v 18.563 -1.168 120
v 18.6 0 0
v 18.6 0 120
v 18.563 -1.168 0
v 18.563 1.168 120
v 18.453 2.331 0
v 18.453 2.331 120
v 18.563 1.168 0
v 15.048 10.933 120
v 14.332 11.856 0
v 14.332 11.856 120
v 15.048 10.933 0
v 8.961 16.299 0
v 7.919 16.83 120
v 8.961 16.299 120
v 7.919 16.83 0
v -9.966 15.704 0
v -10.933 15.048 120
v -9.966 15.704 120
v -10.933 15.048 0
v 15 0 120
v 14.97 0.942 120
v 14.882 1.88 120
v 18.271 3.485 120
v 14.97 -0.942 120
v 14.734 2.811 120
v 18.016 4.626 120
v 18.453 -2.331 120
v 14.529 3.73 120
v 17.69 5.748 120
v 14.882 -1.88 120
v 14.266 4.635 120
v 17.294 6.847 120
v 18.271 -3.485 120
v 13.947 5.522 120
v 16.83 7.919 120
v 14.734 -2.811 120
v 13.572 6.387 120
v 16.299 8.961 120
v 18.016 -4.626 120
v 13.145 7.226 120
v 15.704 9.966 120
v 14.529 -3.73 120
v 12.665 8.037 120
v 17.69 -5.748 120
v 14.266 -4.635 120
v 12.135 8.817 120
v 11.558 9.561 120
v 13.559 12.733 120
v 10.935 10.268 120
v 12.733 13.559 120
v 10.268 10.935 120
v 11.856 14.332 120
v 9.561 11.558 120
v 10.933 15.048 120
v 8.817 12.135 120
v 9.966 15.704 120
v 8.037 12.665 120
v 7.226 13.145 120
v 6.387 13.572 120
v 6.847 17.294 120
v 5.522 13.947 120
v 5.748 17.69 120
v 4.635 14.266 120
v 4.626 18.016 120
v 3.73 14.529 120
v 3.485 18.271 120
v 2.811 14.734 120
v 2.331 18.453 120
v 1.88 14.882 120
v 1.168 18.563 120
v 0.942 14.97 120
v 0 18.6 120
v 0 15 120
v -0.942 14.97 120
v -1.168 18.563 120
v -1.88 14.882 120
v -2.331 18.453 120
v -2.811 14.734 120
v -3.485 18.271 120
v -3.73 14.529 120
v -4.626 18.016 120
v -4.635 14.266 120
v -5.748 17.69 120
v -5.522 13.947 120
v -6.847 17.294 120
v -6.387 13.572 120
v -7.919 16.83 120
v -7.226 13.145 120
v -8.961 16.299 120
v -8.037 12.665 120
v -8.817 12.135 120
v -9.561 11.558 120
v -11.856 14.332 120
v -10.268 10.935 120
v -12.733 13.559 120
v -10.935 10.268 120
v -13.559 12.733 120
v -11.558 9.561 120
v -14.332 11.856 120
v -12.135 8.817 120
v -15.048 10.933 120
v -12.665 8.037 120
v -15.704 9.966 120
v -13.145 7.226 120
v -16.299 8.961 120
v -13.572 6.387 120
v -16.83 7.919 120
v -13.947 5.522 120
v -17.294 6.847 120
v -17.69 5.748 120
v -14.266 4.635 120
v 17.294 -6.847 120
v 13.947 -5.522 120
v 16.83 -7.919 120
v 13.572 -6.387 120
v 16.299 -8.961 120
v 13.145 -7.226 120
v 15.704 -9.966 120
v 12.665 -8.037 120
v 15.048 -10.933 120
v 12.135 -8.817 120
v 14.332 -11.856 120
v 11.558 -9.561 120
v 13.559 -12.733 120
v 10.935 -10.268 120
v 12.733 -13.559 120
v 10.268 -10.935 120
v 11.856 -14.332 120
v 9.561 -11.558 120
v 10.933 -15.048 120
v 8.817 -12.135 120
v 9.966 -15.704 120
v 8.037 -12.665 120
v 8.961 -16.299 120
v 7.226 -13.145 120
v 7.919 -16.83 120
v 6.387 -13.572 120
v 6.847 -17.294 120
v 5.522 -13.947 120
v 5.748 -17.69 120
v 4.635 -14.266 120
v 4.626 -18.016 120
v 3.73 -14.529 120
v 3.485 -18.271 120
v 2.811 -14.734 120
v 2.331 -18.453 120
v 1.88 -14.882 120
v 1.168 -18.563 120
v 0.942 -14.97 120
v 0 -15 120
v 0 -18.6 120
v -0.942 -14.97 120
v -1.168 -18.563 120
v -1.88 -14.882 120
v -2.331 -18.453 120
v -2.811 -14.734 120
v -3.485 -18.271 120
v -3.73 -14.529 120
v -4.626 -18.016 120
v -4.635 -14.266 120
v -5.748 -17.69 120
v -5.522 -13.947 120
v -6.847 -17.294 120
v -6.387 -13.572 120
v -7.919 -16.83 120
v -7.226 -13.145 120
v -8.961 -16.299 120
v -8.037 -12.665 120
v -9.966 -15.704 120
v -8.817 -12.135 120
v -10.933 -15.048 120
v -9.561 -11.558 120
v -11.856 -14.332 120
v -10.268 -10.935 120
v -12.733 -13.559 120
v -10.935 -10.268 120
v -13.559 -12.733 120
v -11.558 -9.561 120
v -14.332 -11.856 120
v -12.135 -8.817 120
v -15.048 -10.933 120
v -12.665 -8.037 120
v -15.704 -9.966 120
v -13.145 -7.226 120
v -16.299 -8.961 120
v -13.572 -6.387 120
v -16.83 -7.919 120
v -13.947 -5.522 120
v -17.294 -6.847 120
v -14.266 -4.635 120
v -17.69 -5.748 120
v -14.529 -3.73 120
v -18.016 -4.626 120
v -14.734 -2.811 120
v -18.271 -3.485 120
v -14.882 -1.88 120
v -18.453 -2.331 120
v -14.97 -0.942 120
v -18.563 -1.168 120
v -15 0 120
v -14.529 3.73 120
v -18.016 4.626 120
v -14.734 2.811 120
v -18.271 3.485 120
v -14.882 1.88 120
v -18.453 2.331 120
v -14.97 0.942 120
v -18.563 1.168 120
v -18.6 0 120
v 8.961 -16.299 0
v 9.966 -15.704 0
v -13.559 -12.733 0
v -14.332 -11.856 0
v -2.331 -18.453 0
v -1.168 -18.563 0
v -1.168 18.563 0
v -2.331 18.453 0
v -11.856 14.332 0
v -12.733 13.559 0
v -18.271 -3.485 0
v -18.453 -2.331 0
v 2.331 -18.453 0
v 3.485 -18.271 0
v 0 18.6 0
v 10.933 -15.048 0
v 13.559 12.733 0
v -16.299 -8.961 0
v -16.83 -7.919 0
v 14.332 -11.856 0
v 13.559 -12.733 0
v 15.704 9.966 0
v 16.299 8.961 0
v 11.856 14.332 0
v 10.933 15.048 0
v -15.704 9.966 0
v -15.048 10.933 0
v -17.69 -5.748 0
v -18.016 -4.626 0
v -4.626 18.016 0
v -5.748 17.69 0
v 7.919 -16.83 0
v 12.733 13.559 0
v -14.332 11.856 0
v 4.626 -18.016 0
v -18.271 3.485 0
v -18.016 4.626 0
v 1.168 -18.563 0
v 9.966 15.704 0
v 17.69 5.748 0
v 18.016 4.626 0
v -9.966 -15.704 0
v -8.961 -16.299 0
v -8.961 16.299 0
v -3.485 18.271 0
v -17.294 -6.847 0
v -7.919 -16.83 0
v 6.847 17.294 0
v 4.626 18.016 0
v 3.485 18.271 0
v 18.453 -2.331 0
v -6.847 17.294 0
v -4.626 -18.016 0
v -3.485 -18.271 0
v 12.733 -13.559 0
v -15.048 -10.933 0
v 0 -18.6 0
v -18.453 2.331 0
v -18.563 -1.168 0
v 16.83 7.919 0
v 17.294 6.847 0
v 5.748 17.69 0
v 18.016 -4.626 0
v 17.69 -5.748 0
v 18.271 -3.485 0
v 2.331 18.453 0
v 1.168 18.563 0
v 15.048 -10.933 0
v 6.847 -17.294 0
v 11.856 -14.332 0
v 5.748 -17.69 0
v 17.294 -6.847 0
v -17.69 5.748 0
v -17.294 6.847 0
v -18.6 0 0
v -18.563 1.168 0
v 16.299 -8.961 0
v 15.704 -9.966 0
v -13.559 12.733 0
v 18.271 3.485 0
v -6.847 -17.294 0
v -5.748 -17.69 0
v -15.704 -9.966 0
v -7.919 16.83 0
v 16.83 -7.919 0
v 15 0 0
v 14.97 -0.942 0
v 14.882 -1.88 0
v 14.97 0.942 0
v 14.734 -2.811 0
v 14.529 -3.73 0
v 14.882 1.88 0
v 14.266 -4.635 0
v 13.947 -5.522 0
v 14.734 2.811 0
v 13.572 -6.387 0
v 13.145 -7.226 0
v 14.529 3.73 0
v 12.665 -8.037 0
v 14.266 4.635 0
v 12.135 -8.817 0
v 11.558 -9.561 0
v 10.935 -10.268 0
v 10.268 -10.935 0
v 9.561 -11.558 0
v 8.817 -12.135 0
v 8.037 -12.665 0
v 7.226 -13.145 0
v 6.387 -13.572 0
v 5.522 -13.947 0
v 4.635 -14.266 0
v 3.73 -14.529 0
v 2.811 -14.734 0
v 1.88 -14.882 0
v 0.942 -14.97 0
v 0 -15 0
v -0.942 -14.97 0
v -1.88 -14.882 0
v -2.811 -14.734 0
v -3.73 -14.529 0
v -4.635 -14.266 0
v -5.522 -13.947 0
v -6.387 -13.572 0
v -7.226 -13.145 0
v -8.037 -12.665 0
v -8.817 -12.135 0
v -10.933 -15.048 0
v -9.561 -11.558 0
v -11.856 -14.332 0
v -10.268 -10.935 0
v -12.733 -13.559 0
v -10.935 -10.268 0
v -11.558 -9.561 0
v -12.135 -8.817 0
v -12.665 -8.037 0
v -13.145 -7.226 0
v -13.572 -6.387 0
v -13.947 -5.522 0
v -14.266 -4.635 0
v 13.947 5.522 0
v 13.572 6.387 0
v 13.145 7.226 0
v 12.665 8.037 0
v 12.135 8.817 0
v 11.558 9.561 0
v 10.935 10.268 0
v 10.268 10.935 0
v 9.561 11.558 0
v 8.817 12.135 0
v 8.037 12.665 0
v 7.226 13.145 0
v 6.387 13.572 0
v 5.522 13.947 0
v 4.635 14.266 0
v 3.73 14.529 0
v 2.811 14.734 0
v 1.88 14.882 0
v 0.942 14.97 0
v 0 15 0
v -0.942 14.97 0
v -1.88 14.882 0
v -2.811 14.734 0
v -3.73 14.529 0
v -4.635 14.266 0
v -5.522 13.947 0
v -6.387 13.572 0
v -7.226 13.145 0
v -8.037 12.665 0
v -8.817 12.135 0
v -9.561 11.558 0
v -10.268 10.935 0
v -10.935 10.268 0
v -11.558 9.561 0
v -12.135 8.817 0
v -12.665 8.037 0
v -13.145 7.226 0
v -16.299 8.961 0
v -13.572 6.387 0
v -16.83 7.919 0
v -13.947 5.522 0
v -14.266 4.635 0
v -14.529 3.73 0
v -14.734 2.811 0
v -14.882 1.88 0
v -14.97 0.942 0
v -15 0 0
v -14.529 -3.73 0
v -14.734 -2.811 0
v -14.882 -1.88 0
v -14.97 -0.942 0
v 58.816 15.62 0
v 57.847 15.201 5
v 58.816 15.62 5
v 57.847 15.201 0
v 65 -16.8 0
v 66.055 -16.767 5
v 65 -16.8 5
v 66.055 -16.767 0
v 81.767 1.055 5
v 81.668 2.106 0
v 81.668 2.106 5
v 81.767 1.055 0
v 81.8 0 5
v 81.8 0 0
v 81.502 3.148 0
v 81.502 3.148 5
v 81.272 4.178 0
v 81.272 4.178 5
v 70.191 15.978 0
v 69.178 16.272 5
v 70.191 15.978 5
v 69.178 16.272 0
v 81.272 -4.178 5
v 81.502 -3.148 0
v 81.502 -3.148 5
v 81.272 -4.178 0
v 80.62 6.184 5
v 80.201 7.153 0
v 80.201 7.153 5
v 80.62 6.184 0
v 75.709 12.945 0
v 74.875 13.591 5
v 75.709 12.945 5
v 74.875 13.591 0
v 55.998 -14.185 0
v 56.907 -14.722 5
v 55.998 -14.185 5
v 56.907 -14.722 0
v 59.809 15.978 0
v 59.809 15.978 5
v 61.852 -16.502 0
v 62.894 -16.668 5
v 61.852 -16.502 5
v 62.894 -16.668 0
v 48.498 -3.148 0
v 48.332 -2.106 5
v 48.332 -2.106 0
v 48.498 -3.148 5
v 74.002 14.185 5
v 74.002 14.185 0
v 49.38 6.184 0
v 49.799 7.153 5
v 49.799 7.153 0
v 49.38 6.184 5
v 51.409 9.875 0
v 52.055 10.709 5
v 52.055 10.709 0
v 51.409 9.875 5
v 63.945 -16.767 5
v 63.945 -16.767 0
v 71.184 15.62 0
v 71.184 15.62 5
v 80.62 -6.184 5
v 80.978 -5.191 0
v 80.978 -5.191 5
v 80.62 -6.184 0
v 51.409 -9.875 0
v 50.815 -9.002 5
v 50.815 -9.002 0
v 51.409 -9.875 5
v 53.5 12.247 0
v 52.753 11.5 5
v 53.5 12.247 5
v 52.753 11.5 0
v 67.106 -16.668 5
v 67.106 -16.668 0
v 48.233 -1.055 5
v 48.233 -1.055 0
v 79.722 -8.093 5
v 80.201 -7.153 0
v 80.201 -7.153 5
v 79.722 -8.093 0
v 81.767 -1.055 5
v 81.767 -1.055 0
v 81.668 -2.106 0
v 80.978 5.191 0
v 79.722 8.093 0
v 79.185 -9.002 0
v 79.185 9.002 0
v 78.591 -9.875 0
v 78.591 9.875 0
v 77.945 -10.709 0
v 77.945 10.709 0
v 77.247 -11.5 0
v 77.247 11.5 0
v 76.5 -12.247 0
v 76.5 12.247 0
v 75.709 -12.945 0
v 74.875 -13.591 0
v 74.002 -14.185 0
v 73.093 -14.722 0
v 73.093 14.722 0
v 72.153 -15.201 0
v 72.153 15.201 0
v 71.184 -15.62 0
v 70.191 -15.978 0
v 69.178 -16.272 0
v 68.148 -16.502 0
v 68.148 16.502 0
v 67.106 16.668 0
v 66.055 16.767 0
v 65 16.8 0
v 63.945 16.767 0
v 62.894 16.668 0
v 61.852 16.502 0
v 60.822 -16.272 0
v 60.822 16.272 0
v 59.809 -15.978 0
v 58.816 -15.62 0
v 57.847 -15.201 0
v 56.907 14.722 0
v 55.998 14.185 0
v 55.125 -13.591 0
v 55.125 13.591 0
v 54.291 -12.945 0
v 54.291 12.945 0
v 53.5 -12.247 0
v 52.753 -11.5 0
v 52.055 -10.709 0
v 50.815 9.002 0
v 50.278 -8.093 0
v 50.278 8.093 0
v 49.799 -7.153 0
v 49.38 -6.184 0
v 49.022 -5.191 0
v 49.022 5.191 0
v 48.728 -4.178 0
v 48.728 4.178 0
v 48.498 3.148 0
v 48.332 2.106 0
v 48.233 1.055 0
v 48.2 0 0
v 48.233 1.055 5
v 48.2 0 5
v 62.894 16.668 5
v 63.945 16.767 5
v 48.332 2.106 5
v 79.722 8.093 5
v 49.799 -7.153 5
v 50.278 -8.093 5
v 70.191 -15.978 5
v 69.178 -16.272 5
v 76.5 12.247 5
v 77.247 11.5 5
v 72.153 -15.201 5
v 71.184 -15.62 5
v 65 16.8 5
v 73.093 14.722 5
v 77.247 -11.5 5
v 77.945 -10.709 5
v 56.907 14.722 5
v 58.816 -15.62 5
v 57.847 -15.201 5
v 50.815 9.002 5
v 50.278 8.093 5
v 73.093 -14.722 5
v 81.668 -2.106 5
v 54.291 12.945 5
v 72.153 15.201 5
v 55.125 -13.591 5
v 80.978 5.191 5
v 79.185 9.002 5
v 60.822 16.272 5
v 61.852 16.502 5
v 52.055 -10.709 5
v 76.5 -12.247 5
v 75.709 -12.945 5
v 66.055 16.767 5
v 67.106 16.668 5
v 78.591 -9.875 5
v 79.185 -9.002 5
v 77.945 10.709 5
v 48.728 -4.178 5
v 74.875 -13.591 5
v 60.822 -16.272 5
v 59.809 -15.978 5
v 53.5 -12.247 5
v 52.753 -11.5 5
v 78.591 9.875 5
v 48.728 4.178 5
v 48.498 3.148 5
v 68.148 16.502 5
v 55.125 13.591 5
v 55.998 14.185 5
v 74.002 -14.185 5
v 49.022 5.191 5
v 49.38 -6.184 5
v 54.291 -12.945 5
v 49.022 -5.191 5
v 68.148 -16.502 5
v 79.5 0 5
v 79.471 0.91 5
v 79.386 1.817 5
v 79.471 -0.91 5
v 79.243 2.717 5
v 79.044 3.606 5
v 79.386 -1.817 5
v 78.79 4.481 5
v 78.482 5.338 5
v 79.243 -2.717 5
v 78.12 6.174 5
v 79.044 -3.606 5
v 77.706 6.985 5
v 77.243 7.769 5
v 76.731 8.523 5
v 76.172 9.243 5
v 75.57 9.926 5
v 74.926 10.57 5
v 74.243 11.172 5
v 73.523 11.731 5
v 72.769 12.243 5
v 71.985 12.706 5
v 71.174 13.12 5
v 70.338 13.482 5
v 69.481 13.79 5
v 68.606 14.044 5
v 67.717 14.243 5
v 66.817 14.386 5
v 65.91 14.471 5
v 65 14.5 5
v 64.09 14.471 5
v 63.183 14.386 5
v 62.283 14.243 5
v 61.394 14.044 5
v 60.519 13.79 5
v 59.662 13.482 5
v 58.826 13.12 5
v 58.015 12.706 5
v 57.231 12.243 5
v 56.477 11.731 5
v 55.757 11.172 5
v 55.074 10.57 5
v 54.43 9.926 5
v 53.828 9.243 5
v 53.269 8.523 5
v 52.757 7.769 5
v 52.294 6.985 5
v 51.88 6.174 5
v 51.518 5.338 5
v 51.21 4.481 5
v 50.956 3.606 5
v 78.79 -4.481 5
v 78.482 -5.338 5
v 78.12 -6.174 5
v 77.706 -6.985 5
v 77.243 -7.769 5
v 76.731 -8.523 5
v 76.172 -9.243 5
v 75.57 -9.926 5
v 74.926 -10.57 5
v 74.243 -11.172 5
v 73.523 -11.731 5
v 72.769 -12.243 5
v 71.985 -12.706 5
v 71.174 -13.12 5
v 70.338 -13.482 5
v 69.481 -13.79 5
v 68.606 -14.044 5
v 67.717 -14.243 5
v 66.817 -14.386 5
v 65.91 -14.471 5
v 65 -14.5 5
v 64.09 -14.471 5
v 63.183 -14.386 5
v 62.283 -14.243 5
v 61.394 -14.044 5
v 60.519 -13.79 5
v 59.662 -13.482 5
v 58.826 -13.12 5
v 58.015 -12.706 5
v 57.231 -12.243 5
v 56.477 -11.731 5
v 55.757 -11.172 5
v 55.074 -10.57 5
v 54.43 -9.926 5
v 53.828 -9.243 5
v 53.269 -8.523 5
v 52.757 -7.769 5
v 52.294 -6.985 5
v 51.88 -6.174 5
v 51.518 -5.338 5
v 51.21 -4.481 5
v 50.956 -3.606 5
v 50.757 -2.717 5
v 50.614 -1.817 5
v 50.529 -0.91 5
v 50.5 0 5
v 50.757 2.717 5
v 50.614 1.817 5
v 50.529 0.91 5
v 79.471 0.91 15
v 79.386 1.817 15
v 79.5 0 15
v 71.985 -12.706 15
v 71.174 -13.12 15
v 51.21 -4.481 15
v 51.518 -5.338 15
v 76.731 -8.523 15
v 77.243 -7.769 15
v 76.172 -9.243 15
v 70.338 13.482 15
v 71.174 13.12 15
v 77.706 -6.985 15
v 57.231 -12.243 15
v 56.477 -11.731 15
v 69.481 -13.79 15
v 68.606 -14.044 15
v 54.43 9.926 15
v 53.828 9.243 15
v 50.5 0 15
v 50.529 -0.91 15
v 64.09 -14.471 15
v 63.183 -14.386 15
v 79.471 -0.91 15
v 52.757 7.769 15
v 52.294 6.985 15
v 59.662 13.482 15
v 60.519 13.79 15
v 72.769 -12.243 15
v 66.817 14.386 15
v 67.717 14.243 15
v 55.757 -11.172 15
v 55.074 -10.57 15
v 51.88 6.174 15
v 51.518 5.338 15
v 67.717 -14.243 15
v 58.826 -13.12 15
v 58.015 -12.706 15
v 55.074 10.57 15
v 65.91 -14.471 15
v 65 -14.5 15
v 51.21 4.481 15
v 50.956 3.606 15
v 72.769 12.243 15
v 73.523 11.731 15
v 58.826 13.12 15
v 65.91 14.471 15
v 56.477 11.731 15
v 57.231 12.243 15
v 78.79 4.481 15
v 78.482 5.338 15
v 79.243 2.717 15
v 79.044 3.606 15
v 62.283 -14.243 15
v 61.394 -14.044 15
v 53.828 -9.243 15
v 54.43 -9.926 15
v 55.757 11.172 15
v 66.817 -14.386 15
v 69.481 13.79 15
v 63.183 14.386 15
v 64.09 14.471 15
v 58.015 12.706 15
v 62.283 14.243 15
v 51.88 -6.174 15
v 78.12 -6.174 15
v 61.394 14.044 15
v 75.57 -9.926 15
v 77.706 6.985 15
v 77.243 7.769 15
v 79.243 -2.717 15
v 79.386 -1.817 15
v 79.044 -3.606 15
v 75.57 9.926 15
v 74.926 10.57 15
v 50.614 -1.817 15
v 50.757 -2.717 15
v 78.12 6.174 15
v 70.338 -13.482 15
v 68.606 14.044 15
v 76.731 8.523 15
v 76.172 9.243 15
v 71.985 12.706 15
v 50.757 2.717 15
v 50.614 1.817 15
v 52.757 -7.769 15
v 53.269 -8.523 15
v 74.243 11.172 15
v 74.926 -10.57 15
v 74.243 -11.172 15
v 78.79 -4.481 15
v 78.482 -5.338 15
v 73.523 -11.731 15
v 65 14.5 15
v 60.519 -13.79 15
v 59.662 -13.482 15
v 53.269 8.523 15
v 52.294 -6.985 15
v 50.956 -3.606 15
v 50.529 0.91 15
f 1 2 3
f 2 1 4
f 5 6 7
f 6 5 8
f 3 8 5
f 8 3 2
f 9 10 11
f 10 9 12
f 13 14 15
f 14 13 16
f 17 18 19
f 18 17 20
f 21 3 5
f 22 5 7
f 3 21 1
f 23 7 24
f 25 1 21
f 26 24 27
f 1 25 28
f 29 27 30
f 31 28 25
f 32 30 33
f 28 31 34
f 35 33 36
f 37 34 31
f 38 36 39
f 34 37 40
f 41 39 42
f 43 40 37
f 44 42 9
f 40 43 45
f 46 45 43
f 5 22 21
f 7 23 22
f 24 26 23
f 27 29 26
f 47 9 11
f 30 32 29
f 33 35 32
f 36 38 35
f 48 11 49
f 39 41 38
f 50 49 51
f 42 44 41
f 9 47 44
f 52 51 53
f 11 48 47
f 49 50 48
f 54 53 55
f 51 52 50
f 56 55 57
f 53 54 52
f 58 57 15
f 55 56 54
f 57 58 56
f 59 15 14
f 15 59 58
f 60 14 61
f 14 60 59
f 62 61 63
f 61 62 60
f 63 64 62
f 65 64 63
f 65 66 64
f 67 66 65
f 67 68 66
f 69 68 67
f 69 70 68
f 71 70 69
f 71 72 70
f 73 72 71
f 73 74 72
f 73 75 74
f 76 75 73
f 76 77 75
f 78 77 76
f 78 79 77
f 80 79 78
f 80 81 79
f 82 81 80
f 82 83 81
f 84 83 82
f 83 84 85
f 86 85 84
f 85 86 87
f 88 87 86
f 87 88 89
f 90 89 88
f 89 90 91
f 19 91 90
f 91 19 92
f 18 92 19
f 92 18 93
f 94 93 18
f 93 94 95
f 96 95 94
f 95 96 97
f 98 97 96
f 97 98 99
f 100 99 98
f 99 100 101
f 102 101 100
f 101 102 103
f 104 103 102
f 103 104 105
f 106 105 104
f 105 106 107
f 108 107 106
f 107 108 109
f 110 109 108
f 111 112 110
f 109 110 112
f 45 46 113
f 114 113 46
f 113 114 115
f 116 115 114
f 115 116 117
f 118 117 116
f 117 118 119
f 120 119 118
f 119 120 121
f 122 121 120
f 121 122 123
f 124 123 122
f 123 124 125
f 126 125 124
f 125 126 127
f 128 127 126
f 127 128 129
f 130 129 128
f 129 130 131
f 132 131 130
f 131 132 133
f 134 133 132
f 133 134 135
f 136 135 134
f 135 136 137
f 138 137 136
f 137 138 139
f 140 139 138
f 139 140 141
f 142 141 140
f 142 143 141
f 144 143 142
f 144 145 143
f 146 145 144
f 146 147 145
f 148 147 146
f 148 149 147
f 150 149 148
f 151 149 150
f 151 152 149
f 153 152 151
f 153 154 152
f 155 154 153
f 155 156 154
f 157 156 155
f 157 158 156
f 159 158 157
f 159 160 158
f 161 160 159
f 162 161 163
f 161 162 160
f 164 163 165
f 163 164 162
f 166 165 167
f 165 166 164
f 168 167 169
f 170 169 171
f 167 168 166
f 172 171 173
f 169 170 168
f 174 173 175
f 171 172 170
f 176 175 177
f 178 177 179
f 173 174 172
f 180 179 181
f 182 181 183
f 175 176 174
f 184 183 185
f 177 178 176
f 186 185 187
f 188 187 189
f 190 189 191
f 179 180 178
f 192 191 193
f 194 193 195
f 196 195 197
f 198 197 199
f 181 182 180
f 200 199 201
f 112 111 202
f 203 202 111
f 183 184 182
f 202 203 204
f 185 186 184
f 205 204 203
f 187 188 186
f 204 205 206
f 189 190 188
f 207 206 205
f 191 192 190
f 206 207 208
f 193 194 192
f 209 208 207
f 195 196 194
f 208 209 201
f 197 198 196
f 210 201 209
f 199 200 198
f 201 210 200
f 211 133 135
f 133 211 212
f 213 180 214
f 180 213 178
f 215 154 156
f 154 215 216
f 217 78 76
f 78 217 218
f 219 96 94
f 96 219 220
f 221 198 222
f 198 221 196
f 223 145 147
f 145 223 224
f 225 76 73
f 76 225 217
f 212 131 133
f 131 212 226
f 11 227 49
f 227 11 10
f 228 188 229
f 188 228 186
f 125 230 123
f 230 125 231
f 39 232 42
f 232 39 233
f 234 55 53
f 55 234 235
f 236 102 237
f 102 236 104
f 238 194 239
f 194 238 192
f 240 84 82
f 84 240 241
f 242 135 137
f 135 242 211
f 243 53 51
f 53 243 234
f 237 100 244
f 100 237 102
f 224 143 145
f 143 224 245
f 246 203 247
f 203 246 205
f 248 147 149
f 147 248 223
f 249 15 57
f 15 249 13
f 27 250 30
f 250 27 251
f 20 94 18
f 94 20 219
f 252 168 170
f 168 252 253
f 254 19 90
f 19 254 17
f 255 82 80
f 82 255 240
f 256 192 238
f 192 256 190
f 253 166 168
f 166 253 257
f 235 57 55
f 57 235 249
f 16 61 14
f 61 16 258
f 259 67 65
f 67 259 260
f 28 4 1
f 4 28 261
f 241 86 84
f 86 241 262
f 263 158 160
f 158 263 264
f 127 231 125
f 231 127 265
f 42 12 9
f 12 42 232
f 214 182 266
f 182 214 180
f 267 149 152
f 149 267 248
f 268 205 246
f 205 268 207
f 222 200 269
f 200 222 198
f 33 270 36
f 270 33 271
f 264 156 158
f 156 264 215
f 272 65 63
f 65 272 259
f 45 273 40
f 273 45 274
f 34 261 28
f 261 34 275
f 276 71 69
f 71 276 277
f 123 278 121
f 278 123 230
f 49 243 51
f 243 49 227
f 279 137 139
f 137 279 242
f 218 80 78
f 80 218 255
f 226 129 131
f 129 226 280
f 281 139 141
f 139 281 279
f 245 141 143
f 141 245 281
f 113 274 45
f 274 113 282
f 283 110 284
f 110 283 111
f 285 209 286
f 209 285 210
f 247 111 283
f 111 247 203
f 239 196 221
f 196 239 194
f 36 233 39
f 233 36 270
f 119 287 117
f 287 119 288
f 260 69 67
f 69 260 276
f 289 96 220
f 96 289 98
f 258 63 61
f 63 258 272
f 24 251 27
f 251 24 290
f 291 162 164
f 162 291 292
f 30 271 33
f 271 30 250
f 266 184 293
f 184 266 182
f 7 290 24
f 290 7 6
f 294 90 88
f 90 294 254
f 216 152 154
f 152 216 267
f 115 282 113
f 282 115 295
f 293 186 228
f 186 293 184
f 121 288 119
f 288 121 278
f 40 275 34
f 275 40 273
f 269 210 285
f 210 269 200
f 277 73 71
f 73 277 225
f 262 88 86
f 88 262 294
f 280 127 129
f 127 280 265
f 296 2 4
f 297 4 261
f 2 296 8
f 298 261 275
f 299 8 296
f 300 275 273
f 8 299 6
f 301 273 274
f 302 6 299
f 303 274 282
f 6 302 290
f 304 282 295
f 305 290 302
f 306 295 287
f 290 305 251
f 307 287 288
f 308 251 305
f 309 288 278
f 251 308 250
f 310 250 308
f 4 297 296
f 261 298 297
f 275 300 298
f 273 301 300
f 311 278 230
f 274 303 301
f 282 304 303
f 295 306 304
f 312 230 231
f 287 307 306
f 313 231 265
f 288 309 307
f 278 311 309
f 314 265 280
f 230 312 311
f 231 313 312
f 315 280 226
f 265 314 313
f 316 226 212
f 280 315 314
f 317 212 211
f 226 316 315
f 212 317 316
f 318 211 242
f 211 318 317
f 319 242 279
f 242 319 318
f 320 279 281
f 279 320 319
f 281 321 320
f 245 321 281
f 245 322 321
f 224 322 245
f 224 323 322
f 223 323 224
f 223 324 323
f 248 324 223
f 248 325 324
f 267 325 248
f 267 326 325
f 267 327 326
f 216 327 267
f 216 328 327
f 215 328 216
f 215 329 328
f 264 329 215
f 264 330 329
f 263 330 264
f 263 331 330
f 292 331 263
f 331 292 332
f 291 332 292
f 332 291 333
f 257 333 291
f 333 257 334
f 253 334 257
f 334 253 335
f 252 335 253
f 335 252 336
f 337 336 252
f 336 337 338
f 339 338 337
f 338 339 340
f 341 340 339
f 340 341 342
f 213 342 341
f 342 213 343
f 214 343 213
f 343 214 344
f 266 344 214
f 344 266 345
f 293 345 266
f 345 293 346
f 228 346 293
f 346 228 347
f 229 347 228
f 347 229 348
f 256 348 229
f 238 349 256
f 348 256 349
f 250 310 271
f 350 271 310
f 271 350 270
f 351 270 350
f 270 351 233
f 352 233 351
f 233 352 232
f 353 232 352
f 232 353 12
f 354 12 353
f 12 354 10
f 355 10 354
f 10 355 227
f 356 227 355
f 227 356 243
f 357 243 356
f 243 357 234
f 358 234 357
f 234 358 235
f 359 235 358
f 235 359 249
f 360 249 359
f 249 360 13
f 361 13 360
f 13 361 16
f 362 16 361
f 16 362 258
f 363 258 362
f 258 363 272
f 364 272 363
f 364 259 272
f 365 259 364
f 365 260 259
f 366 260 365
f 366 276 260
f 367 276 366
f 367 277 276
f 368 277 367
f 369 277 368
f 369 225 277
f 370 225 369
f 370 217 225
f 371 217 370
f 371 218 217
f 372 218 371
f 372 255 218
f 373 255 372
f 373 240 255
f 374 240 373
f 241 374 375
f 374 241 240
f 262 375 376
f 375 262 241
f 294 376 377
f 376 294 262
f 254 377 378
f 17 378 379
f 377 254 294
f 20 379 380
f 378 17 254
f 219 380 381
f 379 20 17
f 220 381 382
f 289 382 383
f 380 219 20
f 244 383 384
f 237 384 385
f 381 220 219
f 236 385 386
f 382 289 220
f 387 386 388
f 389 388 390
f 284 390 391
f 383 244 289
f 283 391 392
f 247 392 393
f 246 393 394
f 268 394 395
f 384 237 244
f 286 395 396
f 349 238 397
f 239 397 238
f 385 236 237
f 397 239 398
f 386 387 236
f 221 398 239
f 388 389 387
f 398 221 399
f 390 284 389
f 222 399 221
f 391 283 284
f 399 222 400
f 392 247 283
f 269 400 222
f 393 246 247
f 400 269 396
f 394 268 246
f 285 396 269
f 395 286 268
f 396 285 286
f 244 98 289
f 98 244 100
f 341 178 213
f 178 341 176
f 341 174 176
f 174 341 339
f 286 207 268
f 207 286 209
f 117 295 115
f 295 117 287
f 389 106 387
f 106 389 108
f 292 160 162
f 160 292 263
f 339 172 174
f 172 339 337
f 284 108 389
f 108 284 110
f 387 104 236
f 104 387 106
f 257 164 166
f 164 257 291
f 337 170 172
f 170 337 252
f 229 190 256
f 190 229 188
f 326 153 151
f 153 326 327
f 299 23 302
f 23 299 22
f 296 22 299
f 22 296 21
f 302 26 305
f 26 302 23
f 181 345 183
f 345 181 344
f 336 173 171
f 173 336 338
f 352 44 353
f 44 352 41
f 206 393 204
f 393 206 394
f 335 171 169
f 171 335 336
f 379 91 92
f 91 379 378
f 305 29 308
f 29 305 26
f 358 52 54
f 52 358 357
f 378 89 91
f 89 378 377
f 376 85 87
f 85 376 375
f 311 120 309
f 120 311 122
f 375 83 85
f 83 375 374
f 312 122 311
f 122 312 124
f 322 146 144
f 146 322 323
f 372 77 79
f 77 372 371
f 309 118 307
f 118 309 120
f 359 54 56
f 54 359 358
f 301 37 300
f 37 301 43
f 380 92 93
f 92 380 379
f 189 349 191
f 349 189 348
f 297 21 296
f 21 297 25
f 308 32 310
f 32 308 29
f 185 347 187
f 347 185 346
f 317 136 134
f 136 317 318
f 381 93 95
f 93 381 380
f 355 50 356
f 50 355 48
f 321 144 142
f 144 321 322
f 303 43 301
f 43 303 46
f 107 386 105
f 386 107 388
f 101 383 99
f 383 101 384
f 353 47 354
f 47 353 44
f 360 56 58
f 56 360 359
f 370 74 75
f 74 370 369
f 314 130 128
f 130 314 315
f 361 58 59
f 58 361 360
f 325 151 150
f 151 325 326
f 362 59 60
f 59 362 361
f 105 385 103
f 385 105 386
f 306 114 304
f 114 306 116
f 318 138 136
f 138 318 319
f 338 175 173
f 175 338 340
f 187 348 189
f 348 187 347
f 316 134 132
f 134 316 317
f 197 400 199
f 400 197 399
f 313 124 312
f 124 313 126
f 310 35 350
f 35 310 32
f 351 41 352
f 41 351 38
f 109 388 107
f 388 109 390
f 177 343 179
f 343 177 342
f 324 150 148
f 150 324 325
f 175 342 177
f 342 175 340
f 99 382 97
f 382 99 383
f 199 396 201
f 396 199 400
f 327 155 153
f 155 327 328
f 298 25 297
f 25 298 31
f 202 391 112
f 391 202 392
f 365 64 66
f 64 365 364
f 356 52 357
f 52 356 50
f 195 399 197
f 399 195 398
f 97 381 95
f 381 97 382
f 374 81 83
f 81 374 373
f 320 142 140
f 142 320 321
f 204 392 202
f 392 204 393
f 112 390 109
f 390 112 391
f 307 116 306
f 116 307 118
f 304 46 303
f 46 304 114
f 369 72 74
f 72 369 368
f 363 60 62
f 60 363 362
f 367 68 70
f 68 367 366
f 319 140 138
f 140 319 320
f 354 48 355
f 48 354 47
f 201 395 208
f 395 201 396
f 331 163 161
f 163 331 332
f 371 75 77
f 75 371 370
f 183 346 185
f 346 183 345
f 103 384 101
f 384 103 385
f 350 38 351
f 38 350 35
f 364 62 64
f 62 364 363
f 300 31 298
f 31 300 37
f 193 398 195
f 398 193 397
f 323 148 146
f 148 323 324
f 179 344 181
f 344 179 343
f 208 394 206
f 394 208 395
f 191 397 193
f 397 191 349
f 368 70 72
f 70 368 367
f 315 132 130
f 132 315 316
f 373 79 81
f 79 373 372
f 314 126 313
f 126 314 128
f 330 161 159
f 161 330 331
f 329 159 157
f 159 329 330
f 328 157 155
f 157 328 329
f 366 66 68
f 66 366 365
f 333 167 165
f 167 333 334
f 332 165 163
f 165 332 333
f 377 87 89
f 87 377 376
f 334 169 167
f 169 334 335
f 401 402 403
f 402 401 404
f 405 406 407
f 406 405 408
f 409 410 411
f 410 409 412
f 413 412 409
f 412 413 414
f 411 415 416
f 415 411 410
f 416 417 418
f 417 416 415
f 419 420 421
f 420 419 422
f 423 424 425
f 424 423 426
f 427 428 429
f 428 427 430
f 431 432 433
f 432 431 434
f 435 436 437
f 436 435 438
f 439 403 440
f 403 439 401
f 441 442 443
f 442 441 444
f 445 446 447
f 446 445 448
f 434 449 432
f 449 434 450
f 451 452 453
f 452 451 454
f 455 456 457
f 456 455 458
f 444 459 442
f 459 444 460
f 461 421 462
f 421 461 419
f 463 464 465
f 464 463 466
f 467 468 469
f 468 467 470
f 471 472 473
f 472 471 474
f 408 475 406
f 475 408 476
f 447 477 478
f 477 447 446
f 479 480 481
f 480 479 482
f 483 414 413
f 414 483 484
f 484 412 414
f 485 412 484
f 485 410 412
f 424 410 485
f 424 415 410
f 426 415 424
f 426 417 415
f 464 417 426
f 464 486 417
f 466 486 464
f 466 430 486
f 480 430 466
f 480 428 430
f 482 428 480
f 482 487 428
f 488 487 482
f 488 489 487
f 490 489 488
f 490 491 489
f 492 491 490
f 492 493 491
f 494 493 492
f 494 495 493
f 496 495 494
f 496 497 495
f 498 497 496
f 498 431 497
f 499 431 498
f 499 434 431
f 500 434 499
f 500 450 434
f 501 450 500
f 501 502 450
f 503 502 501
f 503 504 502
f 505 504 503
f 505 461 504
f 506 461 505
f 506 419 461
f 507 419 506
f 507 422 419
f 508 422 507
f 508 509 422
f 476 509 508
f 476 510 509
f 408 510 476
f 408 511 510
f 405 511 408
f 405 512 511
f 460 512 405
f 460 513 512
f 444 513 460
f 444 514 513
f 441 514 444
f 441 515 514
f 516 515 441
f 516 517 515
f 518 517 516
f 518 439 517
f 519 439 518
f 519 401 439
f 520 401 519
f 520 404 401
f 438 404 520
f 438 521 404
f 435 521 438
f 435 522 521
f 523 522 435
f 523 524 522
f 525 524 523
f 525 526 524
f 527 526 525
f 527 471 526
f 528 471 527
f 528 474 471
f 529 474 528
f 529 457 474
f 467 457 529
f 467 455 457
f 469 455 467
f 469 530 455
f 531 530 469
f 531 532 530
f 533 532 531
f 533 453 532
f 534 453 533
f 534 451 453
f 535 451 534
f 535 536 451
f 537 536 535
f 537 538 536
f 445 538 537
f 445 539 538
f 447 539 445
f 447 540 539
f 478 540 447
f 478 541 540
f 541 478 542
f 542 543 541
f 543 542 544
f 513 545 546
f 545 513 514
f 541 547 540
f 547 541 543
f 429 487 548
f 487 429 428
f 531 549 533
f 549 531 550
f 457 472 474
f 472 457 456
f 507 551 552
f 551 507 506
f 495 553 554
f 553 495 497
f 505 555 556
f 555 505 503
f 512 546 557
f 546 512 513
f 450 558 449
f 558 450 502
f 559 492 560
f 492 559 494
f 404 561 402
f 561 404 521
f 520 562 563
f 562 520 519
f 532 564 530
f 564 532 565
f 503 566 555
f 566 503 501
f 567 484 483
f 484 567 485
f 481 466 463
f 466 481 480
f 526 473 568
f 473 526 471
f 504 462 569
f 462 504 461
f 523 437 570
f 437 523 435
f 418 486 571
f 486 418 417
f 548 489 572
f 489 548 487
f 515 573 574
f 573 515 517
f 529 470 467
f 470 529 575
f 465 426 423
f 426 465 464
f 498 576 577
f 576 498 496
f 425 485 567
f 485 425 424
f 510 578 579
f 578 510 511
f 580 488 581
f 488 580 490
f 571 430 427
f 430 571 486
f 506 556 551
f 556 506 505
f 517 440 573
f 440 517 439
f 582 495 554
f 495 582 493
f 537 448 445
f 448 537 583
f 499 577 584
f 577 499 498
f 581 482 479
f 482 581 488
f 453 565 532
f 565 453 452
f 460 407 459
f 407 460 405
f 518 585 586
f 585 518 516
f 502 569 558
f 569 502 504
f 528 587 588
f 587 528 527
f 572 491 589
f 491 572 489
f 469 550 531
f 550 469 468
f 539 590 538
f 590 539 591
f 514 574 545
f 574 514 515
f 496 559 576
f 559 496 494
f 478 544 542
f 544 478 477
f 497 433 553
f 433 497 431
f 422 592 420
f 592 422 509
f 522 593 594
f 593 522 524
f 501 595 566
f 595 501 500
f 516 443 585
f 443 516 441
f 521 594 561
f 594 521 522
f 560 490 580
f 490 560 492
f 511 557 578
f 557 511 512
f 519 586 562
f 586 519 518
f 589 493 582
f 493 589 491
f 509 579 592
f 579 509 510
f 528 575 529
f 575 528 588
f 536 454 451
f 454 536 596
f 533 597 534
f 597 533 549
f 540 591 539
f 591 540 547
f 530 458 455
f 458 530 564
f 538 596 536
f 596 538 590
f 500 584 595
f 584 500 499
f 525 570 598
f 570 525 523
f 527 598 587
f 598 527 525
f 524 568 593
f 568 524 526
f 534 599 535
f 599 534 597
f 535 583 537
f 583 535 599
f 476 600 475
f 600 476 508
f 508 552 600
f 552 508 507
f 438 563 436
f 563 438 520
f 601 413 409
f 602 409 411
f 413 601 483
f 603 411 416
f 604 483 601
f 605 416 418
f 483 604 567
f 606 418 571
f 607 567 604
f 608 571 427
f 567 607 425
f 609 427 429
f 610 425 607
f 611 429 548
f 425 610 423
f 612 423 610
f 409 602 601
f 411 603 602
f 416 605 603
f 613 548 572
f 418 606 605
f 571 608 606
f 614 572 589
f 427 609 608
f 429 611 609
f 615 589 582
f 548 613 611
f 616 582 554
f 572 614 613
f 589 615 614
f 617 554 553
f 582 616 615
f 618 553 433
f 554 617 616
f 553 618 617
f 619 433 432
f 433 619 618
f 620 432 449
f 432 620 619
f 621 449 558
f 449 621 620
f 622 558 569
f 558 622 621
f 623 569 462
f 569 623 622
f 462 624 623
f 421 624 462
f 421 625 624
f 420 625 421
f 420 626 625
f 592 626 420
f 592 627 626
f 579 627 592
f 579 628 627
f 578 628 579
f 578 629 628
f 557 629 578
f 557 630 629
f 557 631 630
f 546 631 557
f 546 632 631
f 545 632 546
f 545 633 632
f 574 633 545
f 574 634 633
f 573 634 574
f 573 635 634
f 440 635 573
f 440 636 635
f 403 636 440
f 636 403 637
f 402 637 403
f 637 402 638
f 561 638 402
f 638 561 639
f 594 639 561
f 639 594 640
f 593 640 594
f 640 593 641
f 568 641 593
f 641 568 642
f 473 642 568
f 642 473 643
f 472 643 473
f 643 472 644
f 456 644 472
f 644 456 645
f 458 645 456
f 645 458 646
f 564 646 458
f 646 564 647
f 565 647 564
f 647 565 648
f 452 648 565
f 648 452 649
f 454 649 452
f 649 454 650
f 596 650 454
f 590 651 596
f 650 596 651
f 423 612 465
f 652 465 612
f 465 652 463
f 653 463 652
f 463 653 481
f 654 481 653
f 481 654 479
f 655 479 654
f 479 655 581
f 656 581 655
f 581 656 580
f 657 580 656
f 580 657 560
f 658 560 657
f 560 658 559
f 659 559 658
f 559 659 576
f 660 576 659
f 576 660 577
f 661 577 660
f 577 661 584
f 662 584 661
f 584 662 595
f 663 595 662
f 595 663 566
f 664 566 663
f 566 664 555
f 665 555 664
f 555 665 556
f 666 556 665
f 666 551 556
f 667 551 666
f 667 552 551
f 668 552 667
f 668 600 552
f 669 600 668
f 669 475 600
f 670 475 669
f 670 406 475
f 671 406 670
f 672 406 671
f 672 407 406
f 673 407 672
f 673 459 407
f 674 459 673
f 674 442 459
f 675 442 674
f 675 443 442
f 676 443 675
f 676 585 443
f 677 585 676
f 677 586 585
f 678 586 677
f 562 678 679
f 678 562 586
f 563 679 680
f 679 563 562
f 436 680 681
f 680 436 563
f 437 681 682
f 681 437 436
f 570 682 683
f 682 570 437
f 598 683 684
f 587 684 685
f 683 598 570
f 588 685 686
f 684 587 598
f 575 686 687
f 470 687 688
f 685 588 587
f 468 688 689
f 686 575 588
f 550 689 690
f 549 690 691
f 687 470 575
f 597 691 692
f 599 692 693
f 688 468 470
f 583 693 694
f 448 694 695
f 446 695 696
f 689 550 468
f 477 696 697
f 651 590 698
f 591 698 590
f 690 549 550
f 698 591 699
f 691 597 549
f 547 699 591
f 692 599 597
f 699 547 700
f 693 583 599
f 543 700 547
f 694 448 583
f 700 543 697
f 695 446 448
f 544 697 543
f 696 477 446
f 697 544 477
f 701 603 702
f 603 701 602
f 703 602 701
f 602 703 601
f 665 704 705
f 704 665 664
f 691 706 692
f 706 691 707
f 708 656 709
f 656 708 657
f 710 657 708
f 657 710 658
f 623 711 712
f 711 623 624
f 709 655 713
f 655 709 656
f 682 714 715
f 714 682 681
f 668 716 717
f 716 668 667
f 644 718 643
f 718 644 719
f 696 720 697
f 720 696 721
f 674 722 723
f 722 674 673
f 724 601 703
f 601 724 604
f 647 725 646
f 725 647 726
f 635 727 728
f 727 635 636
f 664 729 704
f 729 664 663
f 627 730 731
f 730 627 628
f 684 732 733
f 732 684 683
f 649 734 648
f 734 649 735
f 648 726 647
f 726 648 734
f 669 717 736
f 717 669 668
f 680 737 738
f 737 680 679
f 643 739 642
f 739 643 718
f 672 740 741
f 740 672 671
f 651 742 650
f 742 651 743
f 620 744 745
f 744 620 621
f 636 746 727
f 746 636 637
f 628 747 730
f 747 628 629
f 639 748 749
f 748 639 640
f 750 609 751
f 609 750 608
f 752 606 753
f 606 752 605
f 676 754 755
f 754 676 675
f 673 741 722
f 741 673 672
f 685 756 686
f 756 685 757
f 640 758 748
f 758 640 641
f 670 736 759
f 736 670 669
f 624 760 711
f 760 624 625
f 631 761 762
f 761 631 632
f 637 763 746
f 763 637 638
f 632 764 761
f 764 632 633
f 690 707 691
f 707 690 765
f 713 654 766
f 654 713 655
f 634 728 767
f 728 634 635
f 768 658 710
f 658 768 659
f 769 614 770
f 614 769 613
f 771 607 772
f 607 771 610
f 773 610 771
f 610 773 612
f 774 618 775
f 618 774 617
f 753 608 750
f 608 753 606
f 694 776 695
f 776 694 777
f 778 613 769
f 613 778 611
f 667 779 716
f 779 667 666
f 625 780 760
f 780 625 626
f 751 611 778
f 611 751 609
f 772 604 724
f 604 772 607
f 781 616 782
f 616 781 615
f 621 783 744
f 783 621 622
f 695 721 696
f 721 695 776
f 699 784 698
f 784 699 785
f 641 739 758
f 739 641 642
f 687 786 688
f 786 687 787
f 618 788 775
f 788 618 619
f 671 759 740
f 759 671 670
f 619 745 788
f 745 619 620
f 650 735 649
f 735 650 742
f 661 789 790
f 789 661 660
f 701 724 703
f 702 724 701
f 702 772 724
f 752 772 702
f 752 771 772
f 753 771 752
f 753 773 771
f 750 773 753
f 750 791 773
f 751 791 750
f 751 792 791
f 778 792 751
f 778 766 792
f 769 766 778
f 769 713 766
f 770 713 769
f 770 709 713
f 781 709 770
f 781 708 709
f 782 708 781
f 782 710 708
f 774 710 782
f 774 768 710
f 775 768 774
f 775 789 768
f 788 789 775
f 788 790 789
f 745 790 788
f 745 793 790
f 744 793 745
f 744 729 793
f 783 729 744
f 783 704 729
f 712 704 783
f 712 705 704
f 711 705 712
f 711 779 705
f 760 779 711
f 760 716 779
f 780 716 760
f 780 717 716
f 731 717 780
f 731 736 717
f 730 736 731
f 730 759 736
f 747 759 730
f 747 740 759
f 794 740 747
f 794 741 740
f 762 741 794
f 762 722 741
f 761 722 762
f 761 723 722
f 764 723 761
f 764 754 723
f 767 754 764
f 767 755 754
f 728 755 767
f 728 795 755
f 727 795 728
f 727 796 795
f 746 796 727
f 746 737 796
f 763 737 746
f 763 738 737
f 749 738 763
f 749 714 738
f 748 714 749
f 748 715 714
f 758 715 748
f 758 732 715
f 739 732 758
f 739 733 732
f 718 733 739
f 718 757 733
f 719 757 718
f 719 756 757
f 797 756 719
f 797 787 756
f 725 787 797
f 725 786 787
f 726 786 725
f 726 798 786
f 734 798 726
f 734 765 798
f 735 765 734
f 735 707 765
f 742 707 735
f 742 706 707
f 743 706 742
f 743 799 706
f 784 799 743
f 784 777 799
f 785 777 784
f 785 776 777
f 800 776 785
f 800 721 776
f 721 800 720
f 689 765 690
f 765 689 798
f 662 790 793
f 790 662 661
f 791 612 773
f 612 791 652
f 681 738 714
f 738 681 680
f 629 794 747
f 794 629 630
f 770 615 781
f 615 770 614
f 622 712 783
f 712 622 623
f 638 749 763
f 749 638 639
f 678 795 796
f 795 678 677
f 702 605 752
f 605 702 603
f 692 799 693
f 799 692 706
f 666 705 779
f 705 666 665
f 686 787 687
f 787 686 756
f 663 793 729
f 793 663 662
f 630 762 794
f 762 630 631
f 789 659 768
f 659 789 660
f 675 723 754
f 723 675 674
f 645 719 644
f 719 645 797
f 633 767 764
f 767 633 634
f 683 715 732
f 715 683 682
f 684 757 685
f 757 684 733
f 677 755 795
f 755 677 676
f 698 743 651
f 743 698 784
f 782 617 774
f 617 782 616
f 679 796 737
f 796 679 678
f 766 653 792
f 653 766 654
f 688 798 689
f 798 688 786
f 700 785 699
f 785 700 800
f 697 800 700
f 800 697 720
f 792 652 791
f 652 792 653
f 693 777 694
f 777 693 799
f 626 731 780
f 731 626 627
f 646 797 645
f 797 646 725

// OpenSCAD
// file: library.scad
function sq(x) = x * x;

module ogive_nose_cone(radius, height, slices = 10, thickness = -1) {   //create ogive nose cone with rounded top tip
    
    rounding_level = height -  4*thickness;

    ogive_radius = (height * height + radius * radius) / (2 * radius);
    
    center_x = -ogive_radius + radius;
    center_y = 0;
    
    d = height / slices;
    rounding_sphere_radius = thickness*3;
    rounding_radius = w(rounding_level, ogive_radius); // radius of cone at rounding level

    rounding_sphere_height = rounding_sphere_radius - sqrt(sq(rounding_sphere_radius) - sq(rounding_radius));
    
    echo("rounding_sphere_height=", rounding_sphere_height);
    
    function w(y, r) = center_x + sqrt(
        (r * r) - (y * y)
    );
    
    
    difference () {
        rotate_extrude ($fn = slices)
        difference () {
            polygon(
                points = concat([
                    [0, height],
                    [0, 0],
                    [radius, 0]
                ],
                [ for (i = [0 : (slices - 1)]) [w(i * d, ogive_radius), i * d] ]),
                paths = [ [ for (i = [0 : (slices + 2)]) i ] ]
            );
            
            if (thickness > 0) {
                polygon(
                    points = concat([
                        [0, sqrt(sq(ogive_radius - thickness) - sq(ogive_radius - radius))],
                        [0, 0],
                        [radius - thickness, 0]
                    ],
                    [ for (i = [0 : (slices - 1)]) [w(i * d, ogive_radius - thickness), i * d] ]),
                    paths = [ [ for (i = [0 : (slices + 2)]) i ] ]
                );
            }
        }
        
        translate([0, 0 , rounding_level])      // top rounding to make the cone printable. 
        cylinder(r = radius, h = height);
    }
    translate([0, 0 , rounding_level])
    intersection() {
        cylinder(r=radius, h=height);
        translate([0, 0 , - rounding_sphere_radius + rounding_sphere_height ])
        sphere(rounding_sphere_radius, $fn=slices);
    }
}


module ring(radius, width, height) {
	difference () {
		cylinder(r = radius, h = height);
		translate([0, 0, -1])
		cylinder(r = radius - width, h = height + 2);
	}
}


module ccube(width, depth, height, z_center = false) {
	if (z_center) {
		translate([-width / 2, -depth / 2, -height / 2])
		cube([width, depth, height]);
	} else {
		translate([-width / 2, -depth / 2, 0])
		cube([width, depth, height]);
	}
}

module twisted_ribs(outer_r, inner_r, height, twist, count, wall) {
	angle = 360 / count;
	linear_extrude(height, twist = twist, slices = 20) {
		for (i = [0 : (count - 1)]) {
			rotate([0, 0, i * angle])
			translate([0, inner_r])
			square([wall, wall]);
		}
	}
}

/*
ccube(100, 100, 10);
ring(50, 5, 20);
ring(50, 2, 30);
*/

module screw_anchor(outer_r, inner_r, depth, height, wall) {
	rotate([30, 0, 0])
	difference () {
		//translate([-outer_r / 2 - wall, outer_r / 2, 0])
		translate([-outer_r - wall, -wall, 0])
		cube([(outer_r + wall) * 2, depth, height]);

		//ccube(outer_r + wall * 2, outer_r + wall * 2, height);
		translate([0, outer_r, 0]) {
		cylinder(r = outer_r, h = height / 2);
		cylinder(r = inner_r, h = height);
		
		translate([-outer_r, 0, 0])
		cube([outer_r * 2, depth, height / 2]);
		}
	}
}

module tube(wall_thickness, radius, lenght) {
    difference() {
        cylinder(r = radius + wall_thickness * 2, h = lenght);
        translate([0, 0, -0.05]) cylinder(r = radius, h = lenght + 0.1);
    }
}

module tube_twists_in(wall_thickness, radius, lenght, teeth_twist, teeth_count, teeth_size) {
    difference () {
        twisted_ribs(radius, radius - teeth_size, lenght, teeth_twist, teeth_count, teeth_size);						
        cylinder(r1 = radius - lenght, r2 = radius - wall_thickness, h = lenght);
    }
    tube(wall_thickness, radius, lenght);
    
}

module nozzle_die(wall_thickness, radius, nozzle_lenght, r_throat, r_outcome) {
difference () {
    union () {
        cylinder(r = radius + wall_thickness + 2, h = wall_thickness);    
        translate([0, 0, wall_thickness]) cylinder(r = radius, h = 2.5);
        translate([0, 0, wall_thickness + 2.5])cylinder(r1 = radius, r2 = r_outcome, h = nozzle_lenght / 2);
        translate([0, 0, wall_thickness + nozzle_lenght / 2 + 2.5])cylinder(r1 = r_outcome, r2 = r_throat, h = nozzle_lenght);
    }
    cylinder(r = r_throat, h = 3*nozzle_lenght);
}
}


/*
THICKNESS = 1.1;
RADIUS = 15;
NOZZLE_THROAT_RADIUS = 6/2;
NOZZLE_OUTCOME_RADIUS = 10/2;
NOZZLE_LENGHT = 10;
TOLERANCE = 0.5;
$fn = 100;



color([0, 0, 1]) nozzle_die(THICKNESS, RADIUS - TOLERANCE, NOZZLE_LENGHT, NOZZLE_THROAT_RADIUS, NOZZLE_OUTCOME_RADIUS);
*/


module concentric_cylinders(r, l, thickness, cylinders, spacing) {
    for(i = [0 : cylinders - 1]) {
        tube(thickness, i * (spacing + thickness) + r, l);
    }
}

module pcb_holder (pcb_height, pcb_width, pcb_depth, pcb_holder_overlap, wall_thickness, bottom_thickness, radius)
{
	translate([-radius,-wall_thickness - pcb_depth/2,0])
	{
		difference()
		{
			cube([radius*2, wall_thickness * 2 + pcb_depth, pcb_height + bottom_thickness]);
			union()
			{
				translate([radius - pcb_width/2,wall_thickness,bottom_thickness]) cube([pcb_width, pcb_depth, pcb_height + 0.05]);
				translate([radius - pcb_width/2 + pcb_holder_overlap,-0.05,-0.05]) cube([pcb_width - 2*pcb_holder_overlap,wall_thickness * 2 + pcb_depth+0.1,pcb_height + bottom_thickness+0.1]);
				translate([radius,wall_thickness + pcb_depth/2,-0.05]) tube(radius - pcb_width/2, radius, pcb_height + bottom_thickness+0.1);
			}
		}
	}
}

module triangle_3d(lenght, width, height)
{
	polyhedron(
	points=[[0,0,0],[lenght,0,0],[lenght,width,0],[0,width,0],[0,0,height],[lenght,0,height]],
	faces=[[0,1,2,3],[0,4,5,1],[5,4,3,2],[5,2,1],[3,4,0]]);
}
module pcb_holder_supports(pcb_height, pcb_width, pcb_depth, pcb_holder_overlap, wall_thickness, bottom_thickness, radius, support_height)
{
	translate([0,0,support_height]) pcb_holder(pcb_height, pcb_width, pcb_depth, pcb_holder_overlap, wall_thickness, bottom_thickness, radius);
	difference()
	{
		union()
		{
			translate([radius,wall_thickness + pcb_depth/2,support_height]) rotate([180,0,270]) triangle_3d(wall_thickness * 2 + pcb_depth, radius - pcb_width/2 + pcb_holder_overlap, support_height);
			mirror([1,0,0]) translate([radius,wall_thickness + pcb_depth/2,support_height]) rotate([180,0,270]) triangle_3d(wall_thickness * 2 + pcb_depth, radius - pcb_width/2 + pcb_holder_overlap, support_height);
		}
		tube(radius - pcb_width/2, radius, pcb_height + bottom_thickness+0.1);
	}
}

module parachute_bowl (radius, bottom_thickness, wall_thickness, bowl_depth ,edge_width ,edge_height)
{
	cylinder(r=radius+wall_thickness, h=bottom_thickness);
	translate([0,0,bottom_thickness]) 
tube(wall_thickness, radius, bowl_depth - edge_height);
	translate([0,0,bottom_thickness+bowl_depth-edge_height]) tube(edge_width+wall_thickness,radius, edge_height);
}

module kinderjoint_m(r, h, ball_r, ball_th) {
    cylinder(r = r, h = h);    
    translate([r - ball_r + ball_th , 0, h / 2 ]) sphere(r = ball_r);
    rotate([0, 0, 120]) translate([r - ball_r + ball_th , 0, h / 2 ]) sphere(r = ball_r);
    rotate([0, 0, -120]) translate([r - ball_r + ball_th , 0, h / 2 ]) sphere(r = ball_r);
}

module kinderjoint_m_hollow(r, h, ball_r, ball_th, wall_th) {
    difference() {
        kinderjoint_m(r + wall_th * 2, h, ball_r, ball_th);
        translate([0, 0, -0.05]) cylinder(r = r, h = h + 0.1);
    }
}

module kinderjoint_f(r, h, ball_r, ball_th, wall_th) {
    difference() {
        kinderjoint_m(r + wall_th * 2, h, ball_r + wall_th, ball_th + wall_th);
        translate([0, 0, -0.05]) kinderjoint_m(r, h + 0.1, ball_r, ball_th);
    }
}
// main file
THICKNESS = 1.8;
RADIUS = 15;
LENGHT = 120;
NOZZLE_THROAT_RADIUS = 2;
NOZZLE_OUTCOME_RADIUS = 7;
NOZZLE_LENGHT = 7;
TOLERANCE = 0.5;
$fn = 100;

use <library.scad>


//color([0, 0, 1]) translate([0, RADIUS + 50, 0]) nozzle_die(THICKNESS, RADIUS - TOLERANCE, NOZZLE_LENGHT, NOZZLE_THROAT_RADIUS, NOZZLE_OUTCOME_RADIUS);



color([0, 1, 0]) union() {
    tube(THICKNESS, RADIUS, LENGHT);
}



/*//engine fuel 
color([1, 0, 0]) translate([0, -RADIUS - 50, 0]) tube(RADIUS - NOZZLE_THROAT_RADIUS - TOLERANCE * 6, NOZZLE_THROAT_RADIUS + TOLERANCE * 4, 15);
    translate([0, -RADIUS - 50, 10])
        tube((RADIUS - NOZZLE_THROAT_RADIUS - TOLERANCE * 6) / 2, NOZZLE_THROAT_RADIUS + TOLERANCE * 4, LENGHT);
*/
// engine cup 

color([1, 1, 0]) translate([RADIUS + 50, 0, 0]) 
union() {
    cylinder(r = RADIUS + THICKNESS, h = 5);
    translate([0, 0, 5]) cylinder(r = RADIUS - TOLERANCE, h = 10);
}
